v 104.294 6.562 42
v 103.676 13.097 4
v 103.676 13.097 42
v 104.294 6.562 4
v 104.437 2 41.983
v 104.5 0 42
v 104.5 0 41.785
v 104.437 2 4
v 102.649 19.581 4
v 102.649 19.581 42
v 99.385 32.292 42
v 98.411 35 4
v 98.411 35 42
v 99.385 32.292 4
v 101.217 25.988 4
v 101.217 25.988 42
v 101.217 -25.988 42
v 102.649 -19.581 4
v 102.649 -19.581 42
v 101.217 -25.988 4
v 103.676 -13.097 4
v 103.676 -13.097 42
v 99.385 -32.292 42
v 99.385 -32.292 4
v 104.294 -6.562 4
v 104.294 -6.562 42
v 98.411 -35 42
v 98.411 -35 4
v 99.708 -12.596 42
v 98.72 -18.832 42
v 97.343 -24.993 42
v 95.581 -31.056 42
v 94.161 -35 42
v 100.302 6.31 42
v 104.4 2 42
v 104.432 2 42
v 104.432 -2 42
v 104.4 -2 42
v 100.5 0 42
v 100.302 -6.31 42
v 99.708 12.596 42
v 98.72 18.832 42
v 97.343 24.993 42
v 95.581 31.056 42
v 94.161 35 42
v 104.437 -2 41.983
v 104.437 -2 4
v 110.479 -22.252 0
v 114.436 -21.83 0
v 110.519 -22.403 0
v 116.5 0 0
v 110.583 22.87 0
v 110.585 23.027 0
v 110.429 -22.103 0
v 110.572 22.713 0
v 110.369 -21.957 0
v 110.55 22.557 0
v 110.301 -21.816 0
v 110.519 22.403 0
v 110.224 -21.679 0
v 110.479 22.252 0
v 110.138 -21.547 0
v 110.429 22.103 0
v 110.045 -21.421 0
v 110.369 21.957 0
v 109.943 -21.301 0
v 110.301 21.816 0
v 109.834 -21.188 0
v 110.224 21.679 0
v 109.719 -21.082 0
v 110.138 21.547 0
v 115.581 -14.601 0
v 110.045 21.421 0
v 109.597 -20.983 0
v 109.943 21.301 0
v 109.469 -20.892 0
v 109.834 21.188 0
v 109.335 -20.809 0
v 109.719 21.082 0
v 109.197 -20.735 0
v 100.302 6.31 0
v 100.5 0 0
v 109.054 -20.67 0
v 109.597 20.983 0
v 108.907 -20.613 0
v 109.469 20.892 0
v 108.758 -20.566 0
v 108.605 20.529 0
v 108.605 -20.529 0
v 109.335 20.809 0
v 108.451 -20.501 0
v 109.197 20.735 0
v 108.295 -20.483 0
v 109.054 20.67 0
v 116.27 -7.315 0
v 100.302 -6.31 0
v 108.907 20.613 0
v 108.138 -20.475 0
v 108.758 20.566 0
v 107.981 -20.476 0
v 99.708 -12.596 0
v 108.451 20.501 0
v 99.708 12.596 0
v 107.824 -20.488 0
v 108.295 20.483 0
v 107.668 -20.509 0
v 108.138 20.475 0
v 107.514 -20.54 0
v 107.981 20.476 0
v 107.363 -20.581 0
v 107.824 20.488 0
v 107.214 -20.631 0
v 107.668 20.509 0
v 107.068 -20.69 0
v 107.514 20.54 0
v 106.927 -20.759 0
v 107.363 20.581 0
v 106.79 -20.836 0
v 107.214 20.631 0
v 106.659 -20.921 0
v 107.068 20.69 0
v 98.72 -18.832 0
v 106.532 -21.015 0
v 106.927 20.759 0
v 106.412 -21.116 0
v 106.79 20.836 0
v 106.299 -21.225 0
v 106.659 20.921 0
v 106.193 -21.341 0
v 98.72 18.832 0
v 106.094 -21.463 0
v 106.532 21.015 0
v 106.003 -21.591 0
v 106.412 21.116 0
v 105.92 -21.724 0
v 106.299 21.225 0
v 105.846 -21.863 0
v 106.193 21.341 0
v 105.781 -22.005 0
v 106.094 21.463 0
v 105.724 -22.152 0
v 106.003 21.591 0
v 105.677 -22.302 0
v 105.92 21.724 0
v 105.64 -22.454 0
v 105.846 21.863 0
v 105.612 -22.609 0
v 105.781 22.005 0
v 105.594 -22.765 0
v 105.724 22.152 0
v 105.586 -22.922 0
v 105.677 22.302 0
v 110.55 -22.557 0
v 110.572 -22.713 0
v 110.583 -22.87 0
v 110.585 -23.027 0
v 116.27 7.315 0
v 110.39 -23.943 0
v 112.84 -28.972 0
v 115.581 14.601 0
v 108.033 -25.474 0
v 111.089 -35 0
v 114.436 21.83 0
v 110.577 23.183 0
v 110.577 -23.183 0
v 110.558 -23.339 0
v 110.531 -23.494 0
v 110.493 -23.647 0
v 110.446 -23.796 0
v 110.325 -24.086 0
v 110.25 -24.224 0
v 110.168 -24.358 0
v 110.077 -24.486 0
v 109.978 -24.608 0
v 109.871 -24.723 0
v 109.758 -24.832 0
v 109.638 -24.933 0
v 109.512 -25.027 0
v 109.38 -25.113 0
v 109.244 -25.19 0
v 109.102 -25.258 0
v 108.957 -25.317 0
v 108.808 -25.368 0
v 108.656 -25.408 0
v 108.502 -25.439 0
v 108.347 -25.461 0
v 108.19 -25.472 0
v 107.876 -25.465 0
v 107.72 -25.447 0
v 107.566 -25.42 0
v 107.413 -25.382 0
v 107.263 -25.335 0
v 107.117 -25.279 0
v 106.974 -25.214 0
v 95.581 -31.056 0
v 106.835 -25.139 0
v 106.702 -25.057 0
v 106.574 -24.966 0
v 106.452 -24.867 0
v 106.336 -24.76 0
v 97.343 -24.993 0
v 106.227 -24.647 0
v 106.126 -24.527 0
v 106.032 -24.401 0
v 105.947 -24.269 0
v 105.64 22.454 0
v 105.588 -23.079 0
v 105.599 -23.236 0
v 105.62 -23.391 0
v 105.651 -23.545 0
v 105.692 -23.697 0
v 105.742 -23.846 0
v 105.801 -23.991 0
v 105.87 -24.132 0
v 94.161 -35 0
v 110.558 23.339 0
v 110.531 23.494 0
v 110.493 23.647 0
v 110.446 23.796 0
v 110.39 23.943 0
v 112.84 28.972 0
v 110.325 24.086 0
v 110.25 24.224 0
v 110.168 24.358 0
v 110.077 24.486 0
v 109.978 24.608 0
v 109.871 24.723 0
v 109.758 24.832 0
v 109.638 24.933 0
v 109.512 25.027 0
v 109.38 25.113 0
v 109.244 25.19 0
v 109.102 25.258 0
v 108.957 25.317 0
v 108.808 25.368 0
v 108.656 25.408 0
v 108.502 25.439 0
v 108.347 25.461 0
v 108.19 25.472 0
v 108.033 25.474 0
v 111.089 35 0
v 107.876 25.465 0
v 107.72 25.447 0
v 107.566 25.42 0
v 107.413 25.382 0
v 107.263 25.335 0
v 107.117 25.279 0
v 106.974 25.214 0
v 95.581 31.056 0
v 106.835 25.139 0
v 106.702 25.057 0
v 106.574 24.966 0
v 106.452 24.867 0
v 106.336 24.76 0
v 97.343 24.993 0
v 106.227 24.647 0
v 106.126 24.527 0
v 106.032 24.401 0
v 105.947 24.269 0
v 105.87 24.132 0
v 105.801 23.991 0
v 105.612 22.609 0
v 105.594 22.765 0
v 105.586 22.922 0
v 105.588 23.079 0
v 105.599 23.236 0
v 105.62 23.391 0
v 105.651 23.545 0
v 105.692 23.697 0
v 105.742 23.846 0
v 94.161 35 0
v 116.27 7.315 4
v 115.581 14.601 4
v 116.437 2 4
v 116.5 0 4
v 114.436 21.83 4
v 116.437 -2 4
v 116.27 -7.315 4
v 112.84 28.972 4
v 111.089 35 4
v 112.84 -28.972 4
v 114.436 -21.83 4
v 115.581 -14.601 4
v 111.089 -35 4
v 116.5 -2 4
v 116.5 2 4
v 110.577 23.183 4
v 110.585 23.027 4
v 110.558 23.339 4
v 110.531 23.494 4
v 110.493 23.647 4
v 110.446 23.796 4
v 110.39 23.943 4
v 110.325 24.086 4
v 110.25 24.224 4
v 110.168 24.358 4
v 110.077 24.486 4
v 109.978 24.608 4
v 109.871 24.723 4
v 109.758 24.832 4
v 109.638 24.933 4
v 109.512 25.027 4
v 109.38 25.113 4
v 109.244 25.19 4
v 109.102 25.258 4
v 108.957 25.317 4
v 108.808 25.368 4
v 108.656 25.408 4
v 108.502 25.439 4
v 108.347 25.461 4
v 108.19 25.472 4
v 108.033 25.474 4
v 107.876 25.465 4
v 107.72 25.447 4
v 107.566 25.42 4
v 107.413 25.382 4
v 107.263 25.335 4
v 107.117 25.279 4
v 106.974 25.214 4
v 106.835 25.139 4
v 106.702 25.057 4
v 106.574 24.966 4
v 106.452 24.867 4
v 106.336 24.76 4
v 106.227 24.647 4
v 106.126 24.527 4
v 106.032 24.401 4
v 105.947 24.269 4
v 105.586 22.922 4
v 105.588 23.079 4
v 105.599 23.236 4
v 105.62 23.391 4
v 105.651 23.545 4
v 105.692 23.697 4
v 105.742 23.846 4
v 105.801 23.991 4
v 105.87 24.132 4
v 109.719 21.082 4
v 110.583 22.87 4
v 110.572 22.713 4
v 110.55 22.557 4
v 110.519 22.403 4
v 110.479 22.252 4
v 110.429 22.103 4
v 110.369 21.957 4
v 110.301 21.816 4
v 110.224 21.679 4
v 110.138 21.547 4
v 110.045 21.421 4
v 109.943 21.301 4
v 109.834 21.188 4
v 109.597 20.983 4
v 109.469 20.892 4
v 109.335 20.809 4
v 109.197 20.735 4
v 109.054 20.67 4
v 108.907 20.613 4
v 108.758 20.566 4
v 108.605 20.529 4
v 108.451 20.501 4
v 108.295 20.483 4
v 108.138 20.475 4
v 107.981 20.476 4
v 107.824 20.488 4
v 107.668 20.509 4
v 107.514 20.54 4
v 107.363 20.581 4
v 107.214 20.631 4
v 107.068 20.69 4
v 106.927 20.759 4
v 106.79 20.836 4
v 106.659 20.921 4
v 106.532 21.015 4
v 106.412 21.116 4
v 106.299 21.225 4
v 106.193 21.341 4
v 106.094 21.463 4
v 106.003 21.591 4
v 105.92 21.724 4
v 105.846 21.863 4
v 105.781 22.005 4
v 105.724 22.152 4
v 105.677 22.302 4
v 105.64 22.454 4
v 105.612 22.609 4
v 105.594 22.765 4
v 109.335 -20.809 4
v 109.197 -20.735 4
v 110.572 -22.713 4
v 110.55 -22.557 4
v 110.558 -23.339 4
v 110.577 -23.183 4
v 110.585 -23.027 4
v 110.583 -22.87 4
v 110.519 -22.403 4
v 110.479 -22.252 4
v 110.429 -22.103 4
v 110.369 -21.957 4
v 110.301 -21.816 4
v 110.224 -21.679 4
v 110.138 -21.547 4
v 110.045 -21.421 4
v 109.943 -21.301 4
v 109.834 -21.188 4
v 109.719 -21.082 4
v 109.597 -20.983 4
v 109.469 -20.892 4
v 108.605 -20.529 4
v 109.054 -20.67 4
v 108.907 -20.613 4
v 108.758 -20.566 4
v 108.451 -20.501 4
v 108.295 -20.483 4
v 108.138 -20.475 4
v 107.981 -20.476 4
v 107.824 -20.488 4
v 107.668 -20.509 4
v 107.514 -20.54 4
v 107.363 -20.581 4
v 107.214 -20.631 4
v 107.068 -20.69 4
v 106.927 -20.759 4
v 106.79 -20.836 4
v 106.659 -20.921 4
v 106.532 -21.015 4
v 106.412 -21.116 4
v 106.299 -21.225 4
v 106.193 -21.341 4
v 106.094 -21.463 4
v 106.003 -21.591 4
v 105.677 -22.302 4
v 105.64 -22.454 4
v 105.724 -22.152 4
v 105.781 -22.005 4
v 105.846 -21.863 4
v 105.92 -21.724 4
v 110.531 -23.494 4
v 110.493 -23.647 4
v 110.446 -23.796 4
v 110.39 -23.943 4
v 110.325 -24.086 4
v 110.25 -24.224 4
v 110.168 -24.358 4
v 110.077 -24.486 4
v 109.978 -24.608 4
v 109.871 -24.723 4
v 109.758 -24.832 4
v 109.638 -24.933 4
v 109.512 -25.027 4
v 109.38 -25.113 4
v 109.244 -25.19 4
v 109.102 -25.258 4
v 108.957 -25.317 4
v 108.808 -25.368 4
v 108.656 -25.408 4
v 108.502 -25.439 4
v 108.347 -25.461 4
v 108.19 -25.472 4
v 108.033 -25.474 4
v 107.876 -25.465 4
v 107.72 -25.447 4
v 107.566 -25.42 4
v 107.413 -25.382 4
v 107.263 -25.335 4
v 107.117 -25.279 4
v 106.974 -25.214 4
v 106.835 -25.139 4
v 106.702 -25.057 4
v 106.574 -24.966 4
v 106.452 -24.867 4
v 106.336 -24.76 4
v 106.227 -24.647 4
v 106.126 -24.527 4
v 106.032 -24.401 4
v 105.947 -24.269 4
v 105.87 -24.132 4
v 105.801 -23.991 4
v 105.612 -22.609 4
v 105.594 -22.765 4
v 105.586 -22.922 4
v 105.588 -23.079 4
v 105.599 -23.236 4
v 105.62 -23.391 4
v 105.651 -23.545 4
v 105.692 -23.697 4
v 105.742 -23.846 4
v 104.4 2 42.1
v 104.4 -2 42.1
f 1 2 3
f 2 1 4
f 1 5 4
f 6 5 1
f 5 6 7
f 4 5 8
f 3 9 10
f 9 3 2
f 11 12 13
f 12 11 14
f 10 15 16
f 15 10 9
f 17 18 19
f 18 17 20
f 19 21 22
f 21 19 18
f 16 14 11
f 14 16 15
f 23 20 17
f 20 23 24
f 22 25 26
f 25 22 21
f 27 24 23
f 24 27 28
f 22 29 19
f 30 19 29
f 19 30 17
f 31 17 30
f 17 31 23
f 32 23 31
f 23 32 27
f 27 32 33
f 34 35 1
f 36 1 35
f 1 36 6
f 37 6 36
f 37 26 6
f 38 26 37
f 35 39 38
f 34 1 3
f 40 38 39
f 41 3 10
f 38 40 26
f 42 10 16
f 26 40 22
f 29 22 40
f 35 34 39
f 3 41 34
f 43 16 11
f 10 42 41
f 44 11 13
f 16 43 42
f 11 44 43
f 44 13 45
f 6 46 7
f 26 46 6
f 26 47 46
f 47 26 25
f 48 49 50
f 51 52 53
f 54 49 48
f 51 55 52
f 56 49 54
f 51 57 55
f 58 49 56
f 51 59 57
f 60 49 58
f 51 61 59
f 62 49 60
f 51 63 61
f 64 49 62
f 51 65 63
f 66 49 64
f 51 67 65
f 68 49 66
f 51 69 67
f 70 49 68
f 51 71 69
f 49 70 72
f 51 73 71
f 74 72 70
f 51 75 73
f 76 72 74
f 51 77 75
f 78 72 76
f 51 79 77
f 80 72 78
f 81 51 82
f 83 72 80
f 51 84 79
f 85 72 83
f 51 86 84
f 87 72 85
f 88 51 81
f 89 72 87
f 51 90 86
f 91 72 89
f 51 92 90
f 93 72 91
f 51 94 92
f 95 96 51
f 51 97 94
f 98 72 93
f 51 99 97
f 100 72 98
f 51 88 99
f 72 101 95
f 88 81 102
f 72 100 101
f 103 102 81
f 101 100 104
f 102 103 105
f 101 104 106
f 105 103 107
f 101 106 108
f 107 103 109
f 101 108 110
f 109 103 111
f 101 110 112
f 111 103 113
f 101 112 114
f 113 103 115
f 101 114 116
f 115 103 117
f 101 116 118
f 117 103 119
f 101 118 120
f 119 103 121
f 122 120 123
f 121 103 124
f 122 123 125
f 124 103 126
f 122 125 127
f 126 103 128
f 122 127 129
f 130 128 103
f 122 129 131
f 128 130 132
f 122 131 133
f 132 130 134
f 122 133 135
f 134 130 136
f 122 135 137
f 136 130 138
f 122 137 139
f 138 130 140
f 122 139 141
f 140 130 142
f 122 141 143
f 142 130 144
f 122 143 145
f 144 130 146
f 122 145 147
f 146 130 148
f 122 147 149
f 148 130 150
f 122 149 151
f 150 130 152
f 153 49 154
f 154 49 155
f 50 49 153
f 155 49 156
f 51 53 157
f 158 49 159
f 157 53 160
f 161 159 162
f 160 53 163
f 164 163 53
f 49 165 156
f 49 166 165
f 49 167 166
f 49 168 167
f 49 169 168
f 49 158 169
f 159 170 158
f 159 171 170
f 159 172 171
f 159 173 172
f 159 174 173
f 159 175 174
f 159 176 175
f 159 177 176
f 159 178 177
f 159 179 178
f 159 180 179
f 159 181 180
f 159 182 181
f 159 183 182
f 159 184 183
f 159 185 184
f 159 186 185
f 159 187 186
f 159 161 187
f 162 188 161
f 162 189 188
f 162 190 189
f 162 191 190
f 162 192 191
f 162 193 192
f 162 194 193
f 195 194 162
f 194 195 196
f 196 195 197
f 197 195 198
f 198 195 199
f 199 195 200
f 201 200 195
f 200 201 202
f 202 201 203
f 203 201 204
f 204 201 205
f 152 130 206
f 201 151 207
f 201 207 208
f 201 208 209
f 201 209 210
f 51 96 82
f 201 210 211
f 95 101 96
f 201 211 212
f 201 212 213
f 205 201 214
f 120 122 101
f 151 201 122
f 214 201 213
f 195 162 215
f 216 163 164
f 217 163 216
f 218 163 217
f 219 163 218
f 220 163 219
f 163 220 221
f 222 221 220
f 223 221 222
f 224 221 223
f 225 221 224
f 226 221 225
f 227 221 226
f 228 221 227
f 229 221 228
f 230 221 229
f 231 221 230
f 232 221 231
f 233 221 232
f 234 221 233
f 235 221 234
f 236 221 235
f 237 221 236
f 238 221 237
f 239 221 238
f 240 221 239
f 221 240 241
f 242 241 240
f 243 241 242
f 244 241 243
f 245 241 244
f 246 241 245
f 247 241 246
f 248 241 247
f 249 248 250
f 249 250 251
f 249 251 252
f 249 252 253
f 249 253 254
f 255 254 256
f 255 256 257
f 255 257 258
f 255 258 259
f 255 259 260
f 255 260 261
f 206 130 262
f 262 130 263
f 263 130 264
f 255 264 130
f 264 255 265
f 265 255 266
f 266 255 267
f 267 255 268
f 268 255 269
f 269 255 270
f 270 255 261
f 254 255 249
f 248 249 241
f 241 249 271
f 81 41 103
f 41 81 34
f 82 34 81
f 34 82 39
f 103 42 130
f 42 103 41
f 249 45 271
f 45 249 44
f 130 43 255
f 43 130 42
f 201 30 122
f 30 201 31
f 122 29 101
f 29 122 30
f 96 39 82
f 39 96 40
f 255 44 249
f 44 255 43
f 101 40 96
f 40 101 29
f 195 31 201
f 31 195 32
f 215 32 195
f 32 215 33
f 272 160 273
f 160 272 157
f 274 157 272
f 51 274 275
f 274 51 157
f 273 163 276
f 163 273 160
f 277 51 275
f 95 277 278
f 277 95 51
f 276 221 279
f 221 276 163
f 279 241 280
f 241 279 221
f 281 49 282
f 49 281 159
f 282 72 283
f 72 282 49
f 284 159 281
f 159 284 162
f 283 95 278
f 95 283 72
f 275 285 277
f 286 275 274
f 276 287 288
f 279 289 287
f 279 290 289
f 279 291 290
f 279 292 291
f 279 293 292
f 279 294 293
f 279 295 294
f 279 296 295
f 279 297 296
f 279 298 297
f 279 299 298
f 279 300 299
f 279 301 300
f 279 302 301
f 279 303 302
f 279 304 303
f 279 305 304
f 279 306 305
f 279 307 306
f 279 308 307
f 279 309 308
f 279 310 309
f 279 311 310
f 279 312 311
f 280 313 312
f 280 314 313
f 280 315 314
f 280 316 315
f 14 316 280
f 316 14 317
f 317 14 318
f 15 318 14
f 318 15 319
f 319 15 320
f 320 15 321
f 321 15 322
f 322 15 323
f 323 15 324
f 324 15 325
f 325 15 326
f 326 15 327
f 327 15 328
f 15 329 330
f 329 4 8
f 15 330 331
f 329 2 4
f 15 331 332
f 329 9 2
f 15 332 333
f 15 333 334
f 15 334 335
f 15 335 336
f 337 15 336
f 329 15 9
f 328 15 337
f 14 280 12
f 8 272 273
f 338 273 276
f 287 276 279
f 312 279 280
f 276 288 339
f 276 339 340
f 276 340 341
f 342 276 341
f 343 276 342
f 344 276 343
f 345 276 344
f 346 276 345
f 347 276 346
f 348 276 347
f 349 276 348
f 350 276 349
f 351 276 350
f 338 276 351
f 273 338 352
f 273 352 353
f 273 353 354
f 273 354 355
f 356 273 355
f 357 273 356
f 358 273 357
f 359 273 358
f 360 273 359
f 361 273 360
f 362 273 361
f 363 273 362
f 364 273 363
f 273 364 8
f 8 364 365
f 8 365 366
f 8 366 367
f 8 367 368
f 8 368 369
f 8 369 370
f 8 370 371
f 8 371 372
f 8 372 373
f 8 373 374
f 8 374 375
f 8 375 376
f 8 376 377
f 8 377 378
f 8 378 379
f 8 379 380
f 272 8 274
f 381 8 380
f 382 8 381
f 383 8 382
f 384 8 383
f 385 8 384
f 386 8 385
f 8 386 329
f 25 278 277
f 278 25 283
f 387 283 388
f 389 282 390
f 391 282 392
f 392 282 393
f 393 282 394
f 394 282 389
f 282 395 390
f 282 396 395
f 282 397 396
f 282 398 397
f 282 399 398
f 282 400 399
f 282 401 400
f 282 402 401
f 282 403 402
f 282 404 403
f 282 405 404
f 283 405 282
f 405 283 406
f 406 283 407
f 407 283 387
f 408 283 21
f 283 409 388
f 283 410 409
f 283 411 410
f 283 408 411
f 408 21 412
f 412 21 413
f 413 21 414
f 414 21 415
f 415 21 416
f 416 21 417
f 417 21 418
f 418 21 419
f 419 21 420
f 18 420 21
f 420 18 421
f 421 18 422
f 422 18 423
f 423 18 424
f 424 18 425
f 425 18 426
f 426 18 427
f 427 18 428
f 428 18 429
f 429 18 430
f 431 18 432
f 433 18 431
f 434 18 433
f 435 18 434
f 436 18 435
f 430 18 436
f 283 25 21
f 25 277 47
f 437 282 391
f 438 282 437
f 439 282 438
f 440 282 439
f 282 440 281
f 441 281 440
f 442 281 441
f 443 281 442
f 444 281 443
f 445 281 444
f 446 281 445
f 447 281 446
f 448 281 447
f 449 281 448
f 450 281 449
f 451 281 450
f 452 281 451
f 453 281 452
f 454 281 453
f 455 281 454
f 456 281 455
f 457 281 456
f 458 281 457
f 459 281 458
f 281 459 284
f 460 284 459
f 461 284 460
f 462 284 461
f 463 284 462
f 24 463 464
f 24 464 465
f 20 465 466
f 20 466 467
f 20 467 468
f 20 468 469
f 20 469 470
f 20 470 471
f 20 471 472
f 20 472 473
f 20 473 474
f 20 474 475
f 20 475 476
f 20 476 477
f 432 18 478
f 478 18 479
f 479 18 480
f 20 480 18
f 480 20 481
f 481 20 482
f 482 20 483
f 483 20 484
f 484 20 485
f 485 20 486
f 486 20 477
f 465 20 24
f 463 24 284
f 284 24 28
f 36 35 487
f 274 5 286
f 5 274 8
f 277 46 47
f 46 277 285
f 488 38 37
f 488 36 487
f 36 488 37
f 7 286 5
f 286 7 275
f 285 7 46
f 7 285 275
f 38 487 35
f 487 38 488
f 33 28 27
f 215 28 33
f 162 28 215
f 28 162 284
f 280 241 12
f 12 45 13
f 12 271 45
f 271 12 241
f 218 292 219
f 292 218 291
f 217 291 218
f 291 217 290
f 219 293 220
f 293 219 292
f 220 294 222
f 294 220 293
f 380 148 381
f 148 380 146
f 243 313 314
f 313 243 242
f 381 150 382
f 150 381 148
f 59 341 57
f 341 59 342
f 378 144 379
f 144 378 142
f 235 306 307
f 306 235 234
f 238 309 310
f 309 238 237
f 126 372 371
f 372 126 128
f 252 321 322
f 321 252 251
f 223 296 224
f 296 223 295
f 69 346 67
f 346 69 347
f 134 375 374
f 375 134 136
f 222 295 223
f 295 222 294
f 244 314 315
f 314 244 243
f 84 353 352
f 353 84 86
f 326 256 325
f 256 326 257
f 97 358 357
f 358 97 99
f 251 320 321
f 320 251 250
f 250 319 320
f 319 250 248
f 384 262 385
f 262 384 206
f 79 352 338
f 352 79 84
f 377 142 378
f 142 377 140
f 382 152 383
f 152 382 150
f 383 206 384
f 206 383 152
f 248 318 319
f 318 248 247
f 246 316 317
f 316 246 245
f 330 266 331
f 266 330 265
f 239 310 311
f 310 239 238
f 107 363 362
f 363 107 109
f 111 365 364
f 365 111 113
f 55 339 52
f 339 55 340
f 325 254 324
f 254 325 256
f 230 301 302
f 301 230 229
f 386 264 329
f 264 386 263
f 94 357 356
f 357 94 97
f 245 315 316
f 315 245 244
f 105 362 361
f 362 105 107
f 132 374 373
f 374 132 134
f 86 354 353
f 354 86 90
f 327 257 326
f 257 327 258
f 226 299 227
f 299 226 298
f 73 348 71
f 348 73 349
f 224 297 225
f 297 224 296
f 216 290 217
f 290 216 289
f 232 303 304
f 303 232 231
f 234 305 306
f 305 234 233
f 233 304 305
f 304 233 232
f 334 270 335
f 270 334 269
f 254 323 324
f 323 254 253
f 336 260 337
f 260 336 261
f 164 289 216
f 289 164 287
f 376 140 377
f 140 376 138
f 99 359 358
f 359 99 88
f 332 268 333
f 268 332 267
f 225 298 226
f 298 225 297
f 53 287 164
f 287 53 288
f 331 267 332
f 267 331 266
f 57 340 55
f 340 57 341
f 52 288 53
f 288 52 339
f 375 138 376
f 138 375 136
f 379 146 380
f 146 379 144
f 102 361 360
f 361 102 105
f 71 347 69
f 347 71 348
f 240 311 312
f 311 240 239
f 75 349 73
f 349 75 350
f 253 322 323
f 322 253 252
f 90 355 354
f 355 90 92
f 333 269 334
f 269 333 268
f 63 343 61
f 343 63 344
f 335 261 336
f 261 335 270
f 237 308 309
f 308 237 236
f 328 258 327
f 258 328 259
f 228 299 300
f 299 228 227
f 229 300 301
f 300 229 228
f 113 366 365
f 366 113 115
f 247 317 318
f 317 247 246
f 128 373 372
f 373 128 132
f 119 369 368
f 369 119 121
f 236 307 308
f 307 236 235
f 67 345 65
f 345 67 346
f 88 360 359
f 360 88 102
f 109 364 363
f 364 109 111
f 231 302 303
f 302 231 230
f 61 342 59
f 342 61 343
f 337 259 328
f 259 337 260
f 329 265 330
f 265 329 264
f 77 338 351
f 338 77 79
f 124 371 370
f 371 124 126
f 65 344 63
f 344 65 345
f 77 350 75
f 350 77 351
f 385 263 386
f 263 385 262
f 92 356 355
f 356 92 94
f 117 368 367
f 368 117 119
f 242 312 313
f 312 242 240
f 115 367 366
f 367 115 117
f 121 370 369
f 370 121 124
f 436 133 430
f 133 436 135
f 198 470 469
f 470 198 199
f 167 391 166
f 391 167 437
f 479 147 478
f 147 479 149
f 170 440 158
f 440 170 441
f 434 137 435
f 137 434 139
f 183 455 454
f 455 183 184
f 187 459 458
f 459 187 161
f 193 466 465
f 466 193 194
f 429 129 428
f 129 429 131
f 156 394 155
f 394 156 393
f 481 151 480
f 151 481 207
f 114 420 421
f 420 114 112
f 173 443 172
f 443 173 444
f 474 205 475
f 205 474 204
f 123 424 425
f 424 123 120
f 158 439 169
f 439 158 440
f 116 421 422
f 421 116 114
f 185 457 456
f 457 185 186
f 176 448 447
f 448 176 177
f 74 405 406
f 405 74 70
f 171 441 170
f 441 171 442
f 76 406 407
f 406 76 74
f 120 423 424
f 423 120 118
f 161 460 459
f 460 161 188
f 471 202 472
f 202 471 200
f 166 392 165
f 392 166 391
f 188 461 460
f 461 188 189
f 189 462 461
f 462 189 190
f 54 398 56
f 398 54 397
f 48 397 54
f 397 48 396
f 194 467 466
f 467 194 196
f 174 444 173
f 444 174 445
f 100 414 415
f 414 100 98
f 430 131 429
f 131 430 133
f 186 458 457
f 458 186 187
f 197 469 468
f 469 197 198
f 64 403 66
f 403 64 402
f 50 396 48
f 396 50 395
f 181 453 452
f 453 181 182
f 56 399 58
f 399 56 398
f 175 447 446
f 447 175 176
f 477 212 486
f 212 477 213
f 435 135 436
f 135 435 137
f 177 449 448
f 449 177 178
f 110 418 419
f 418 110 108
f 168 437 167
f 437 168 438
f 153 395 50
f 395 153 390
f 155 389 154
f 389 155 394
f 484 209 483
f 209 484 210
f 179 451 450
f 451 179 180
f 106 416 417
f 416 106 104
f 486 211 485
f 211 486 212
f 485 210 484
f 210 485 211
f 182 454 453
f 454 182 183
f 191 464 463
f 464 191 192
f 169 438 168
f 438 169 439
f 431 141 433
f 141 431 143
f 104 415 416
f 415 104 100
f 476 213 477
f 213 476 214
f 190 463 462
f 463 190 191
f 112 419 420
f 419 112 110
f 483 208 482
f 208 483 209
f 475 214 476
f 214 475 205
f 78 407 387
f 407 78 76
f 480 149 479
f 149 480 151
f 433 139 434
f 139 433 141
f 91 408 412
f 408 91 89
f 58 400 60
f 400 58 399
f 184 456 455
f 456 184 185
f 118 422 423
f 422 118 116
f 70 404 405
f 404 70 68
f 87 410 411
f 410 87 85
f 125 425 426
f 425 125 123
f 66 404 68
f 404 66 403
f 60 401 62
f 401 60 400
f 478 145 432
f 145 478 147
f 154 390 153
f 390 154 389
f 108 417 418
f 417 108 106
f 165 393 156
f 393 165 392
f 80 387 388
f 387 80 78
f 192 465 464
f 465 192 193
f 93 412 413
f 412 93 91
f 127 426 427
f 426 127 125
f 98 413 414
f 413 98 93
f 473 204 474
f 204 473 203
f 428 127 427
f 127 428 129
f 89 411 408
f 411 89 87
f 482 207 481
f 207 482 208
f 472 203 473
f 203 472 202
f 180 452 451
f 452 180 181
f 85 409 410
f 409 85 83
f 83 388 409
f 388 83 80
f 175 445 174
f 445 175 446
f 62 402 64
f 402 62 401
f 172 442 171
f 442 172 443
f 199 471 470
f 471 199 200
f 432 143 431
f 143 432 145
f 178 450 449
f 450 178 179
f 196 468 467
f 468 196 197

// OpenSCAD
$fn=100;

dia_couronne=201;
hauteur_couronne=42;
epaisseur=4;
largeur_base=12;
longueur=70;
dia_trous=5;
angle_trous=12;

module rond()
{
	difference()
	{
		cylinder(d=dia_couronne+2*epaisseur,h=hauteur_couronne);
		translate([0,0,-1])
            cylinder(d=dia_couronne,h=hauteur_couronne+2);
	}
}

module base()
{
	difference()
	{
		cylinder(d=dia_couronne+2*epaisseur+2*largeur_base,h=epaisseur);
		translate([0,0,-1])
            cylinder(d=dia_couronne+2*epaisseur-0.1,h=hauteur_couronne+2);
	}
}

module renfort(angle)
{
	rotate([0,0,angle])
		translate([dia_couronne/2+epaisseur-0.1,epaisseur/2,epaisseur])
			rotate([90,0,0])
				linear_extrude(epaisseur)
					polygon([[0,0],[largeur_base+0.1,0],[0,hauteur_couronne-epaisseur+0.1]]);
}

module support()
{
	difference()
	{
		union()
		{
			rond();
			base();
			renfort(0);
		}
		translate([0,-longueur/2-(dia_couronne/2+largeur_base+epaisseur+0.2)/2,0])
			cube([dia_couronne+2*largeur_base+2*epaisseur+0.2,dia_couronne/2+largeur_base+epaisseur+0.2,2*hauteur_couronne+0.2],center=true);
	translate([0,+longueur/2+(dia_couronne/2+largeur_base+epaisseur+0.2)/2,0])
			cube([dia_couronne+2*largeur_base+2*epaisseur+0.2,dia_couronne/2+largeur_base+epaisseur+0.2,2*hauteur_couronne+0.2],center=true);
	translate([-(dia_couronne/2+largeur_base+epaisseur)/2-0.1,0,0])
			cube([dia_couronne/2+largeur_base+epaisseur+0.2,longueur+0.2,2*hauteur_couronne+0.2],center=true);
	}
}

module trous()
{
	//sur la couronne
	//rotate([0,0,angle_trous])
	//	translate([0,0,hauteur_couronne/2])
	//		rotate([0,90,0])
	//			cylinder(d=dia_trous,h=dia_couronne);
	//rotate([0,0,-angle_trous])
	//	translate([0,0,hauteur_couronne/2])
	//		rotate([0,90,0])
	//			cylinder(d=dia_trous,h=dia_couronne);
	//sur la base
	rotate([0,0,angle_trous])
		translate([dia_couronne/2+epaisseur+largeur_base/2,0,-0.1])
			cylinder(d=dia_trous,h=epaisseur+0.2);
	rotate([0,0,-angle_trous])
		translate([dia_couronne/2+epaisseur+largeur_base/2,0,-0.1])
			cylinder(d=dia_trous,h=epaisseur+0.2);
	
}
module support_couronne() {
difference()
{
	support();
	trous();
}
}
support_couronne();
